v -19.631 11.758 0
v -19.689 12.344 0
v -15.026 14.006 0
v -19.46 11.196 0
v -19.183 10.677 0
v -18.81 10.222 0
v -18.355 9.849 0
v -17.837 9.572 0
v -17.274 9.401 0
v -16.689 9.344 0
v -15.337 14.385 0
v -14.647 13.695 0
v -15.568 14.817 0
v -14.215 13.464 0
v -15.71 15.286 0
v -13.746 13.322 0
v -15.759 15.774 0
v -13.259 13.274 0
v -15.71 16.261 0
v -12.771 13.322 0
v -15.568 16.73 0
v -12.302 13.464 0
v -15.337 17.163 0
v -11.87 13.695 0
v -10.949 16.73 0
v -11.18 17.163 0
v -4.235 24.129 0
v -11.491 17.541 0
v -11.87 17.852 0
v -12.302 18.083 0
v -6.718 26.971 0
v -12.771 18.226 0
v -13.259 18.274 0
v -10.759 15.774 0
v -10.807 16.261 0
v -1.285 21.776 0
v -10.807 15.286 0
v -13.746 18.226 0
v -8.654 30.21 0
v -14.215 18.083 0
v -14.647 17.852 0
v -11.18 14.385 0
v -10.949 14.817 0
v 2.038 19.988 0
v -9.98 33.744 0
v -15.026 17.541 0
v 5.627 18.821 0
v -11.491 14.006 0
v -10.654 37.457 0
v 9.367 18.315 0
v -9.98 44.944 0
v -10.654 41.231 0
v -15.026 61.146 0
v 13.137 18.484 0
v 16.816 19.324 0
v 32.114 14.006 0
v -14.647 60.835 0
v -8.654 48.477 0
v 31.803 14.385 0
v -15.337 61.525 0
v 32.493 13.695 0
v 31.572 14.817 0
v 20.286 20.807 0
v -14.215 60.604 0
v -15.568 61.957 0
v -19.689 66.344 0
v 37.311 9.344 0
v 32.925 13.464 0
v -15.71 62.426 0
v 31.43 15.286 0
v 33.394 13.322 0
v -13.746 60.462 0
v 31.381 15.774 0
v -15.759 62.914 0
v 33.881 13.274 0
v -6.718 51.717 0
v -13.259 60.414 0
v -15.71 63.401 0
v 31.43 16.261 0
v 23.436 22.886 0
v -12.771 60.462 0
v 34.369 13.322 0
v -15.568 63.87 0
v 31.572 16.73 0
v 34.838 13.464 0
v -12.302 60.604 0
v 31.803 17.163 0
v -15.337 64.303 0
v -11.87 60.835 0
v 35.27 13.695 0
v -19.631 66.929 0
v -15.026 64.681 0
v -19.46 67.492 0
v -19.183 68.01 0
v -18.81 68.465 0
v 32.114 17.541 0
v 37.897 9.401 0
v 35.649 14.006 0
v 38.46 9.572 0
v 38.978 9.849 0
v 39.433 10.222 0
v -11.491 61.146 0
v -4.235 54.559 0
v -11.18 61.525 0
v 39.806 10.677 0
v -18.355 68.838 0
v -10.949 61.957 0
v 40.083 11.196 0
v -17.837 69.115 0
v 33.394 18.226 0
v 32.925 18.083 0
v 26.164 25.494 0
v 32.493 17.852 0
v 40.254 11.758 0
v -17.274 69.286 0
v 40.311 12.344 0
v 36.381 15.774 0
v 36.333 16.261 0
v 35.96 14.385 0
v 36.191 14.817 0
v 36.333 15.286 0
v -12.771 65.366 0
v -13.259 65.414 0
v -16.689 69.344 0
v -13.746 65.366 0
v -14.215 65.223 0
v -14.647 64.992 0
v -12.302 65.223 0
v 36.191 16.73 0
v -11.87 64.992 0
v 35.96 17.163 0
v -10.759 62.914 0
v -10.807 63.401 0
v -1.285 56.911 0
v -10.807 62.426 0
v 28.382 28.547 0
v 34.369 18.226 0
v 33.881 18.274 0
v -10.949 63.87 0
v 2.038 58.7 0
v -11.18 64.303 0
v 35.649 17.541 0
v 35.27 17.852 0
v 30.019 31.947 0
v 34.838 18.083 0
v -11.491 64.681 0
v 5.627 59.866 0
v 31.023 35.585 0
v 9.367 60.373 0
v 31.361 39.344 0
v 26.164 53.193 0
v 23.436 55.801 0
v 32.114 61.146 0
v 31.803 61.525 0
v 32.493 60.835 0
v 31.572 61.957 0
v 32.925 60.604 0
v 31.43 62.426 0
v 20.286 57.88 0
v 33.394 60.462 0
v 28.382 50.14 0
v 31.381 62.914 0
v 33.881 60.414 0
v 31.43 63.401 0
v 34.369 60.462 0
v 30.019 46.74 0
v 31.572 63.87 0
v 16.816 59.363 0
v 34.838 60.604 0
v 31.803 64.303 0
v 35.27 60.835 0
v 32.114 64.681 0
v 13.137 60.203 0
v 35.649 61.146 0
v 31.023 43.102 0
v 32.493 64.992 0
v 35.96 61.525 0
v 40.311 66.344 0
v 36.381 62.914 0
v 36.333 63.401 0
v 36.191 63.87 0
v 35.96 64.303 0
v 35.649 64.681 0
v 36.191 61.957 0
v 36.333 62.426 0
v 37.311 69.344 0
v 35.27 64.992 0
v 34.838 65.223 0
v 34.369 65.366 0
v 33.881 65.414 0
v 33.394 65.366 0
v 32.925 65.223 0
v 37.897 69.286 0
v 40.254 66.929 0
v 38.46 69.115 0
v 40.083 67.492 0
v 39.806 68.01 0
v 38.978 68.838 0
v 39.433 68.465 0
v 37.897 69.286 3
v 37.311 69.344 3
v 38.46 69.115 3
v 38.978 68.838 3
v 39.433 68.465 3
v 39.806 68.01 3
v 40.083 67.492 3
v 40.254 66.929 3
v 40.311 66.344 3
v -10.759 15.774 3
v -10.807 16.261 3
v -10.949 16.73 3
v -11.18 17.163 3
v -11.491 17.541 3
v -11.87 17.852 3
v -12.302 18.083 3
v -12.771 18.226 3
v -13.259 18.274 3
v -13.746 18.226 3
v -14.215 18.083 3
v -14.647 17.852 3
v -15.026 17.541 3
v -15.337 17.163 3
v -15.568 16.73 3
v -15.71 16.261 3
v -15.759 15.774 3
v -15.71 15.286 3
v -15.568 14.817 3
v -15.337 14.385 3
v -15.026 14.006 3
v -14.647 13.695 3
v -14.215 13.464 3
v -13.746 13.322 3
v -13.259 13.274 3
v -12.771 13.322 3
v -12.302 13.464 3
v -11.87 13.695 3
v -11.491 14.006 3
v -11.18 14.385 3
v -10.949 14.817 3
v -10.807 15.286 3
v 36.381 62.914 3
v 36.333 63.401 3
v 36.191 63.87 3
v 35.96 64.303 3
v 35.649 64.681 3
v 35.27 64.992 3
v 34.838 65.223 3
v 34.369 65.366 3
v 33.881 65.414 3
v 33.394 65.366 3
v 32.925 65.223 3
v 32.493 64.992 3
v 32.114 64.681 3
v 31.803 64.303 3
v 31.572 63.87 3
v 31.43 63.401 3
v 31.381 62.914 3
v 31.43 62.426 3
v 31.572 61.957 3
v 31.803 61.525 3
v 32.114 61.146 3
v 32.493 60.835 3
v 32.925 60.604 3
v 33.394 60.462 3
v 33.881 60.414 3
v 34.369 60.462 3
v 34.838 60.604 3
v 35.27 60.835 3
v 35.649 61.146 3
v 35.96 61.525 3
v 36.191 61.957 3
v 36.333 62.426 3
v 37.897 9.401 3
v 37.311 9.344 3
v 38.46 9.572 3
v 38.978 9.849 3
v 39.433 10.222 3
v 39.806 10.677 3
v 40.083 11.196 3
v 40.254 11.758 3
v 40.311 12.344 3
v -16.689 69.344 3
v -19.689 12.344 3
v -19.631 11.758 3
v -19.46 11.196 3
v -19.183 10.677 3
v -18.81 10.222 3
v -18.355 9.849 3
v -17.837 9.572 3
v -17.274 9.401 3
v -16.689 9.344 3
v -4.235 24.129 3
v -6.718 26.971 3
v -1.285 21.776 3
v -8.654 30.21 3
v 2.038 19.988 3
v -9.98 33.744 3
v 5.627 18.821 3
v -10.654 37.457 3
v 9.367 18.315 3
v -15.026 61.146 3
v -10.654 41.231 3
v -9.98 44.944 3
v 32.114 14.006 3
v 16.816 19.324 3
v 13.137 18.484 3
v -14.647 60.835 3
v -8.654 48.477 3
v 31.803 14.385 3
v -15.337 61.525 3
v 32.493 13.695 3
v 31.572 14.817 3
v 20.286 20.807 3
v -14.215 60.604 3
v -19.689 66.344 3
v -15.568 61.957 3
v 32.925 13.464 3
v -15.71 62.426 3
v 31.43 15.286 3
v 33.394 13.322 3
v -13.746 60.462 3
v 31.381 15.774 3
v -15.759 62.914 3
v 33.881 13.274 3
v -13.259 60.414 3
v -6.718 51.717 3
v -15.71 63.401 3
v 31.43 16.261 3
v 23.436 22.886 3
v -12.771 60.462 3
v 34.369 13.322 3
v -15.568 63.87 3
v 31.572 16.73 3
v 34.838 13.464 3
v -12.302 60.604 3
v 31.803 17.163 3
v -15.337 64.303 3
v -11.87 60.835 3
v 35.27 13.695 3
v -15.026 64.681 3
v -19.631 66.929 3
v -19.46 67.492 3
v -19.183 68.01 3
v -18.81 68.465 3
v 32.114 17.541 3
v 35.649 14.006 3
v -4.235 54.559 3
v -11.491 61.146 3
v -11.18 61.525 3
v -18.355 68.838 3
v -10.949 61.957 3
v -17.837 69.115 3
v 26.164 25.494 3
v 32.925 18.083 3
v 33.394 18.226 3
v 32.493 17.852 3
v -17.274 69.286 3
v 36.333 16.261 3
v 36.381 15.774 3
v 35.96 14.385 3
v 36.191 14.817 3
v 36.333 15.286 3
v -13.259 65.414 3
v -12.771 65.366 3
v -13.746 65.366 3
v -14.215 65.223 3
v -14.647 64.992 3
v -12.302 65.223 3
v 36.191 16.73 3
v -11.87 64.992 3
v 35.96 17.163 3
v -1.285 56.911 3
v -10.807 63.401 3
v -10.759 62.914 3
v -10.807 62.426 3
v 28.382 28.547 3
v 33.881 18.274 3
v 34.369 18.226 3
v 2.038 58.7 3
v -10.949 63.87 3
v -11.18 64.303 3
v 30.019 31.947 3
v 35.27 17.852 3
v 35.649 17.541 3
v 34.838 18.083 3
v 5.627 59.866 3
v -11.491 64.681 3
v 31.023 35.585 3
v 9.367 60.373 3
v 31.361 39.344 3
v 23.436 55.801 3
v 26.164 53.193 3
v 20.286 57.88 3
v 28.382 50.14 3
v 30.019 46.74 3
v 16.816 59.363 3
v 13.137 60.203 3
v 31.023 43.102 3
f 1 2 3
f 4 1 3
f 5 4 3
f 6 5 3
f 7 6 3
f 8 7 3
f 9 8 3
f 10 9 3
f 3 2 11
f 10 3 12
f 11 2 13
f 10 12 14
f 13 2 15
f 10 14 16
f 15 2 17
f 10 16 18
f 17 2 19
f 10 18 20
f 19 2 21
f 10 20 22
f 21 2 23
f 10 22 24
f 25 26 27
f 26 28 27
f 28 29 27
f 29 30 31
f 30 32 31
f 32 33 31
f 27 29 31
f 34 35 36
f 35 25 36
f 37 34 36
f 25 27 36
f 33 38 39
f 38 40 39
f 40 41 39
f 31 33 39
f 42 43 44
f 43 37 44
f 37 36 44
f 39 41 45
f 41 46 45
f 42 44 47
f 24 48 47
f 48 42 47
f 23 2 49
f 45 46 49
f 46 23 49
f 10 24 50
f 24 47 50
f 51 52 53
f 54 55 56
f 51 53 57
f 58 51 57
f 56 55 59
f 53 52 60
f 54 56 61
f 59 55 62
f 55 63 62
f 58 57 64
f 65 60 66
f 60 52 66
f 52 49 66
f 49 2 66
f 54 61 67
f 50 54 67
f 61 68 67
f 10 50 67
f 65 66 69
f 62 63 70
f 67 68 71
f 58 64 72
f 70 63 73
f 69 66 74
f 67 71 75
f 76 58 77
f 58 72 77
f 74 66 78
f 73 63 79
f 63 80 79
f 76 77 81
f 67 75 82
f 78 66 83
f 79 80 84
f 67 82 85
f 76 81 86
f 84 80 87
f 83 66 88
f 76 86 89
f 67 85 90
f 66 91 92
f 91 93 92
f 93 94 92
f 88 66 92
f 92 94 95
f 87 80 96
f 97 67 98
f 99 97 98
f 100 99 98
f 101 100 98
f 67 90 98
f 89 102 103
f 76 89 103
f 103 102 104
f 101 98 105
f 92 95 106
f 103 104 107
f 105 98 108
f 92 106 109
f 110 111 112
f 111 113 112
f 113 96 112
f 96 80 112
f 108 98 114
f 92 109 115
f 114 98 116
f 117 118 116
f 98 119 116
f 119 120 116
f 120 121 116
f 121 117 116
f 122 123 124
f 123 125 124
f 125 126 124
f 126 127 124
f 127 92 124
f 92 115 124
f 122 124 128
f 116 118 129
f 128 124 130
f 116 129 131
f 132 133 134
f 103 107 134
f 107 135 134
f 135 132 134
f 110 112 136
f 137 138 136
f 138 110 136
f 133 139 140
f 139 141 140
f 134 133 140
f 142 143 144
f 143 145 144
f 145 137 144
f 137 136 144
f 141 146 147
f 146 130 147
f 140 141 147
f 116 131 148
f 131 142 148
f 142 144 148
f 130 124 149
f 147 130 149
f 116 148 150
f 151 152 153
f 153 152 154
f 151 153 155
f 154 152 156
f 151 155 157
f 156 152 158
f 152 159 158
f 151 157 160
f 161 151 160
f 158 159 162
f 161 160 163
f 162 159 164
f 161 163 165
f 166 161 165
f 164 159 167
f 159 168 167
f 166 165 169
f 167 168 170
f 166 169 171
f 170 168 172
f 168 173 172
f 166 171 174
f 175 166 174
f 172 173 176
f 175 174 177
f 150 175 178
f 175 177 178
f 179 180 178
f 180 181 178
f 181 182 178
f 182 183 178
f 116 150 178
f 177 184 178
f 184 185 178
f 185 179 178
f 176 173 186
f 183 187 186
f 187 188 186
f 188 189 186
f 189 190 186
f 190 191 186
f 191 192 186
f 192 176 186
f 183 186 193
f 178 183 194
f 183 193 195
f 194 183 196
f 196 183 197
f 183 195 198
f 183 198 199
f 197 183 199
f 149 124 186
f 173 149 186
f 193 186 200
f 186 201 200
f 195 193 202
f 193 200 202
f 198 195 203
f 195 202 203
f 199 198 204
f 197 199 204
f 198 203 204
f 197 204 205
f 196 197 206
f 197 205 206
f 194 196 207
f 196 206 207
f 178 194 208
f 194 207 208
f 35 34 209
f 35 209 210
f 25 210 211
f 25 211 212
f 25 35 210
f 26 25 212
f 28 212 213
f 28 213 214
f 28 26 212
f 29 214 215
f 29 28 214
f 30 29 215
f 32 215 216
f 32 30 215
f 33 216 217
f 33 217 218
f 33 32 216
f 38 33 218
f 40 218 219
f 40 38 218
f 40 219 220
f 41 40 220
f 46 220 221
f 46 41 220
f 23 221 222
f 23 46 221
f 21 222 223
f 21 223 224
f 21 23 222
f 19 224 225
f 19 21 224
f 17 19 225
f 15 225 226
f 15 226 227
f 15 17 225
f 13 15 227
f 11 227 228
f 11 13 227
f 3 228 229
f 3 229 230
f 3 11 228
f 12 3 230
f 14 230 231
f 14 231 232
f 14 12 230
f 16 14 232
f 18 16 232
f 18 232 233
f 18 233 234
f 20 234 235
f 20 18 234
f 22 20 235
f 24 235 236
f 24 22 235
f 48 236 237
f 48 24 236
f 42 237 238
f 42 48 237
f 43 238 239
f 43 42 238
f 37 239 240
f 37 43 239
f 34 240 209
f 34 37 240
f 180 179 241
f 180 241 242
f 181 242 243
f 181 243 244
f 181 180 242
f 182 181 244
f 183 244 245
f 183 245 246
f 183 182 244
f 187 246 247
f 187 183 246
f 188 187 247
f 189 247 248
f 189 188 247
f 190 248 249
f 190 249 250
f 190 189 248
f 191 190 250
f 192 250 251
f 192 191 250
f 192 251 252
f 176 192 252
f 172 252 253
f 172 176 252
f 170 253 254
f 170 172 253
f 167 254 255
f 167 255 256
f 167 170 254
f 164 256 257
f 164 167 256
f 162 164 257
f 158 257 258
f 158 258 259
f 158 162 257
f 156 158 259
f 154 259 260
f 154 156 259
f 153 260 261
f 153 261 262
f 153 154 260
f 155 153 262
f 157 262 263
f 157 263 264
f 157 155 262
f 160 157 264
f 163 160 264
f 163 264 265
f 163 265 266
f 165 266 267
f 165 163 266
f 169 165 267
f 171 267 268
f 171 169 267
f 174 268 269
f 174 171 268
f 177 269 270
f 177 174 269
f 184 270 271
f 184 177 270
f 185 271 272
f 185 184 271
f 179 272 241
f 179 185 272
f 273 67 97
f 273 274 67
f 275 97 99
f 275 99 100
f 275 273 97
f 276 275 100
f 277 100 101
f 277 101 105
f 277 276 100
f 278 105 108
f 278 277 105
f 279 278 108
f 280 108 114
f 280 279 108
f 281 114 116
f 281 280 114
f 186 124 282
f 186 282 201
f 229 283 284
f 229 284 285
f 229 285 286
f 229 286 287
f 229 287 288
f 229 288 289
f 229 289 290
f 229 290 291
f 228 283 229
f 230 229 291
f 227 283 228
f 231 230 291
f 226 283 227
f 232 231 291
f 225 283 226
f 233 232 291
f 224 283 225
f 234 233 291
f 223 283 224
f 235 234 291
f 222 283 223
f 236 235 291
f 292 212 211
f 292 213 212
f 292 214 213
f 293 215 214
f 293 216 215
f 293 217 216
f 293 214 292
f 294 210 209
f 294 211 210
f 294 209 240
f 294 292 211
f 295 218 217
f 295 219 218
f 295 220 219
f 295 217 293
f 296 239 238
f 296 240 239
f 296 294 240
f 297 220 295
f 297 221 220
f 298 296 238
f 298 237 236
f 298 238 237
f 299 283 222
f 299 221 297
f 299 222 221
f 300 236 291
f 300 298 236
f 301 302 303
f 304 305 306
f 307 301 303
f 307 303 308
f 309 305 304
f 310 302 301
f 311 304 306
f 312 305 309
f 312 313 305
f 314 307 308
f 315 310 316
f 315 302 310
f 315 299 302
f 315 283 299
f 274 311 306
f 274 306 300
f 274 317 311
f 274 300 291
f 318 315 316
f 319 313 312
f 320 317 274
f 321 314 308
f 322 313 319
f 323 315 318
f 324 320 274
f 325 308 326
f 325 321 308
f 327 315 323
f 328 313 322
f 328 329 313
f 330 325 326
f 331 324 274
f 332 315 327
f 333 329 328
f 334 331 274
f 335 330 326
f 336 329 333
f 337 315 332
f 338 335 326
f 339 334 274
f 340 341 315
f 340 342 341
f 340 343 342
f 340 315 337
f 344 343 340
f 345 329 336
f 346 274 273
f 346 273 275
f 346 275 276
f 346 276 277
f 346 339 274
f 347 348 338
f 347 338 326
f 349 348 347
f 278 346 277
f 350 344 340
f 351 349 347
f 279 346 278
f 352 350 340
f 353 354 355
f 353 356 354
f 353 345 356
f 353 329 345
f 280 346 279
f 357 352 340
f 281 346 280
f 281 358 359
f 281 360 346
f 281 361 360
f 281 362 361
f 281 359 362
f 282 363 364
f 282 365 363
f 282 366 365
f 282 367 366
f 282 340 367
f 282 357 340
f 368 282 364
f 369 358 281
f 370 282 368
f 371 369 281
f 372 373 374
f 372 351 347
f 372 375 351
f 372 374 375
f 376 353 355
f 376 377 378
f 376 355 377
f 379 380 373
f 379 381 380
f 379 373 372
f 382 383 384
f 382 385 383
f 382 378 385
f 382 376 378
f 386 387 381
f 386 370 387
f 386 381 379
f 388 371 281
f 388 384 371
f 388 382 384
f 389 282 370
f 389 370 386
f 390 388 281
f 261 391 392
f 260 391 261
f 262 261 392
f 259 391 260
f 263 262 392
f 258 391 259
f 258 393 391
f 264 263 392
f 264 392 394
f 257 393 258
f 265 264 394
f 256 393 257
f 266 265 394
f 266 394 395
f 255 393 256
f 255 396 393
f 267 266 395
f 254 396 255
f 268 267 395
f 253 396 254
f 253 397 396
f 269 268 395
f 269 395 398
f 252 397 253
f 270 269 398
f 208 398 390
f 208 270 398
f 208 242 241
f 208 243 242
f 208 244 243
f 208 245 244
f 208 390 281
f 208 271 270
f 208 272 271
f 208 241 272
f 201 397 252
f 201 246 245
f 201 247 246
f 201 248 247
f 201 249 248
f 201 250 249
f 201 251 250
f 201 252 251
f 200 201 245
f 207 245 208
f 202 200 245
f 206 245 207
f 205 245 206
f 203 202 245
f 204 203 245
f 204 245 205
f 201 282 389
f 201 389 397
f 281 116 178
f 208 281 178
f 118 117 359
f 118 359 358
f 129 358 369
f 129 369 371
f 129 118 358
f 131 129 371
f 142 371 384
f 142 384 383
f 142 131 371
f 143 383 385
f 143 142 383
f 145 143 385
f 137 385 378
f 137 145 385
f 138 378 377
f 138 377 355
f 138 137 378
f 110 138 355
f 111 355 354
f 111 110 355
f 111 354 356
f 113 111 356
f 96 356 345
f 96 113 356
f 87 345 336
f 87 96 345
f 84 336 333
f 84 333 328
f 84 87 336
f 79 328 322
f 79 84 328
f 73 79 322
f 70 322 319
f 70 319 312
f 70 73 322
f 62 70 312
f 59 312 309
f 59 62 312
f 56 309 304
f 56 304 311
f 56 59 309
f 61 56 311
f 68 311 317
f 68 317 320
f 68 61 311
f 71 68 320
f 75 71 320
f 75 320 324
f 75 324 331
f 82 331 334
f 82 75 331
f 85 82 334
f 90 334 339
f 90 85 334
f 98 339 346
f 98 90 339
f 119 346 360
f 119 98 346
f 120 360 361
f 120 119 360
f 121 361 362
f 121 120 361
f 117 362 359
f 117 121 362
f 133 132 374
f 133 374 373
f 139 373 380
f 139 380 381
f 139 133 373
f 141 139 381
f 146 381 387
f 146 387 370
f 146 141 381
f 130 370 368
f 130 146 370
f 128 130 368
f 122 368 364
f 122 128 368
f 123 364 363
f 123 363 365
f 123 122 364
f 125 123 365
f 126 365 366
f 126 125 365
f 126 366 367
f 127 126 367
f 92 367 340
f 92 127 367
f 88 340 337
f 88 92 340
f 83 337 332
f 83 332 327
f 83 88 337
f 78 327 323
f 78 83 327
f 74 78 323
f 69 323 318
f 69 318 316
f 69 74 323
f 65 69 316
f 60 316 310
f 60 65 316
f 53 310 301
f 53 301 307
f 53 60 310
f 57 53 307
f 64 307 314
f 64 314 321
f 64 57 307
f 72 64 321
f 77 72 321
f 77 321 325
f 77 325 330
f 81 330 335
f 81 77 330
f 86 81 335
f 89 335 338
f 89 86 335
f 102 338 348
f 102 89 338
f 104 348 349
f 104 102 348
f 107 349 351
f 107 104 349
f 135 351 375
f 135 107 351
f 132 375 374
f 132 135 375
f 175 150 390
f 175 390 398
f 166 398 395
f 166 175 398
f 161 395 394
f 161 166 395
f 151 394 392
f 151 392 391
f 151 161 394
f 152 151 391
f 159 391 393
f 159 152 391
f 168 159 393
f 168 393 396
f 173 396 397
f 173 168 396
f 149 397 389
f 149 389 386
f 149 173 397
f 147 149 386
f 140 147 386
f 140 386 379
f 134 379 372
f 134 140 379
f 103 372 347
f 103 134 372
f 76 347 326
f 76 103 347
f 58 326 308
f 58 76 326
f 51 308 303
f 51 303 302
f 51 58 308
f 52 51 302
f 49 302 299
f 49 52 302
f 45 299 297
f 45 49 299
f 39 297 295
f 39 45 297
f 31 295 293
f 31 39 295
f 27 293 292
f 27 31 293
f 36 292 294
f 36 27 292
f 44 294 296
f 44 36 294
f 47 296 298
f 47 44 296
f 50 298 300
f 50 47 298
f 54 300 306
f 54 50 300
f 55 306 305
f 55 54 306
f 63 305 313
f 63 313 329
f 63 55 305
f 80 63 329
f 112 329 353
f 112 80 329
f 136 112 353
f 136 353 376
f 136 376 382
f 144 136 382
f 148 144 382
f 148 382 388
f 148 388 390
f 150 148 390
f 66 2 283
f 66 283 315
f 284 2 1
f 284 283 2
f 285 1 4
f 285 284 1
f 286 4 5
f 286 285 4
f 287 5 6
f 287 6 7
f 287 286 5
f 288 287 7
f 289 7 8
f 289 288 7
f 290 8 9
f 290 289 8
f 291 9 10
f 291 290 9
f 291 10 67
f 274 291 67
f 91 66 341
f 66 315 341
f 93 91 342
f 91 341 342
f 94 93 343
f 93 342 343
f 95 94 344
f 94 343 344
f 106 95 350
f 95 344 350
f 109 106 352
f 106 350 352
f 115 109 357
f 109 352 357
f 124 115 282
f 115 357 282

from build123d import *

# Parameters (mm, degrees)
SKETCH2_W           = 60
SKETCH2_H           = 60
SKETCH2_R           = 2.5
SKETCH2_R_2         = 21.05
BOSS_EXTRUDE1_DEPTH = 3
FILLET1_R           = 3


with BuildPart() as part:
    # Sketch2 → Boss-Extrude1 (new body)
    with BuildSketch(Plane.XY):
        with Locations((10.311464729, 39.343711654)):
            Rectangle(SKETCH2_W, SKETCH2_H)
        with Locations((33.881464729, 15.773711654)):
            Circle(SKETCH2_R, mode=Mode.SUBTRACT)
        with Locations((-13.258535271, 15.773711654)):
            Circle(SKETCH2_R, mode=Mode.SUBTRACT)
        with Locations((-13.258535271, 62.913711654)):
            Circle(SKETCH2_R, mode=Mode.SUBTRACT)
        with Locations((10.311464729, 39.343711654)):
            Circle(SKETCH2_R_2, mode=Mode.SUBTRACT)
        with Locations((33.881464729, 62.913711654)):
            Circle(SKETCH2_R, mode=Mode.SUBTRACT)
    extrude(amount=BOSS_EXTRUDE1_DEPTH)

    # Fillet1
    fillet1_edges = [part.edges().sort_by_distance(p)[0] for p in [
        (-19.688535271, 9.343711654, 1.5),
        (-19.688535271, 69.343711654, 1.5),
        (40.311464729, 69.343711654, 1.5),
        (40.311464729, 9.343711654, 1.5),
    ]]
    fillet(fillet1_edges, radius=FILLET1_R)


solid = part.part
